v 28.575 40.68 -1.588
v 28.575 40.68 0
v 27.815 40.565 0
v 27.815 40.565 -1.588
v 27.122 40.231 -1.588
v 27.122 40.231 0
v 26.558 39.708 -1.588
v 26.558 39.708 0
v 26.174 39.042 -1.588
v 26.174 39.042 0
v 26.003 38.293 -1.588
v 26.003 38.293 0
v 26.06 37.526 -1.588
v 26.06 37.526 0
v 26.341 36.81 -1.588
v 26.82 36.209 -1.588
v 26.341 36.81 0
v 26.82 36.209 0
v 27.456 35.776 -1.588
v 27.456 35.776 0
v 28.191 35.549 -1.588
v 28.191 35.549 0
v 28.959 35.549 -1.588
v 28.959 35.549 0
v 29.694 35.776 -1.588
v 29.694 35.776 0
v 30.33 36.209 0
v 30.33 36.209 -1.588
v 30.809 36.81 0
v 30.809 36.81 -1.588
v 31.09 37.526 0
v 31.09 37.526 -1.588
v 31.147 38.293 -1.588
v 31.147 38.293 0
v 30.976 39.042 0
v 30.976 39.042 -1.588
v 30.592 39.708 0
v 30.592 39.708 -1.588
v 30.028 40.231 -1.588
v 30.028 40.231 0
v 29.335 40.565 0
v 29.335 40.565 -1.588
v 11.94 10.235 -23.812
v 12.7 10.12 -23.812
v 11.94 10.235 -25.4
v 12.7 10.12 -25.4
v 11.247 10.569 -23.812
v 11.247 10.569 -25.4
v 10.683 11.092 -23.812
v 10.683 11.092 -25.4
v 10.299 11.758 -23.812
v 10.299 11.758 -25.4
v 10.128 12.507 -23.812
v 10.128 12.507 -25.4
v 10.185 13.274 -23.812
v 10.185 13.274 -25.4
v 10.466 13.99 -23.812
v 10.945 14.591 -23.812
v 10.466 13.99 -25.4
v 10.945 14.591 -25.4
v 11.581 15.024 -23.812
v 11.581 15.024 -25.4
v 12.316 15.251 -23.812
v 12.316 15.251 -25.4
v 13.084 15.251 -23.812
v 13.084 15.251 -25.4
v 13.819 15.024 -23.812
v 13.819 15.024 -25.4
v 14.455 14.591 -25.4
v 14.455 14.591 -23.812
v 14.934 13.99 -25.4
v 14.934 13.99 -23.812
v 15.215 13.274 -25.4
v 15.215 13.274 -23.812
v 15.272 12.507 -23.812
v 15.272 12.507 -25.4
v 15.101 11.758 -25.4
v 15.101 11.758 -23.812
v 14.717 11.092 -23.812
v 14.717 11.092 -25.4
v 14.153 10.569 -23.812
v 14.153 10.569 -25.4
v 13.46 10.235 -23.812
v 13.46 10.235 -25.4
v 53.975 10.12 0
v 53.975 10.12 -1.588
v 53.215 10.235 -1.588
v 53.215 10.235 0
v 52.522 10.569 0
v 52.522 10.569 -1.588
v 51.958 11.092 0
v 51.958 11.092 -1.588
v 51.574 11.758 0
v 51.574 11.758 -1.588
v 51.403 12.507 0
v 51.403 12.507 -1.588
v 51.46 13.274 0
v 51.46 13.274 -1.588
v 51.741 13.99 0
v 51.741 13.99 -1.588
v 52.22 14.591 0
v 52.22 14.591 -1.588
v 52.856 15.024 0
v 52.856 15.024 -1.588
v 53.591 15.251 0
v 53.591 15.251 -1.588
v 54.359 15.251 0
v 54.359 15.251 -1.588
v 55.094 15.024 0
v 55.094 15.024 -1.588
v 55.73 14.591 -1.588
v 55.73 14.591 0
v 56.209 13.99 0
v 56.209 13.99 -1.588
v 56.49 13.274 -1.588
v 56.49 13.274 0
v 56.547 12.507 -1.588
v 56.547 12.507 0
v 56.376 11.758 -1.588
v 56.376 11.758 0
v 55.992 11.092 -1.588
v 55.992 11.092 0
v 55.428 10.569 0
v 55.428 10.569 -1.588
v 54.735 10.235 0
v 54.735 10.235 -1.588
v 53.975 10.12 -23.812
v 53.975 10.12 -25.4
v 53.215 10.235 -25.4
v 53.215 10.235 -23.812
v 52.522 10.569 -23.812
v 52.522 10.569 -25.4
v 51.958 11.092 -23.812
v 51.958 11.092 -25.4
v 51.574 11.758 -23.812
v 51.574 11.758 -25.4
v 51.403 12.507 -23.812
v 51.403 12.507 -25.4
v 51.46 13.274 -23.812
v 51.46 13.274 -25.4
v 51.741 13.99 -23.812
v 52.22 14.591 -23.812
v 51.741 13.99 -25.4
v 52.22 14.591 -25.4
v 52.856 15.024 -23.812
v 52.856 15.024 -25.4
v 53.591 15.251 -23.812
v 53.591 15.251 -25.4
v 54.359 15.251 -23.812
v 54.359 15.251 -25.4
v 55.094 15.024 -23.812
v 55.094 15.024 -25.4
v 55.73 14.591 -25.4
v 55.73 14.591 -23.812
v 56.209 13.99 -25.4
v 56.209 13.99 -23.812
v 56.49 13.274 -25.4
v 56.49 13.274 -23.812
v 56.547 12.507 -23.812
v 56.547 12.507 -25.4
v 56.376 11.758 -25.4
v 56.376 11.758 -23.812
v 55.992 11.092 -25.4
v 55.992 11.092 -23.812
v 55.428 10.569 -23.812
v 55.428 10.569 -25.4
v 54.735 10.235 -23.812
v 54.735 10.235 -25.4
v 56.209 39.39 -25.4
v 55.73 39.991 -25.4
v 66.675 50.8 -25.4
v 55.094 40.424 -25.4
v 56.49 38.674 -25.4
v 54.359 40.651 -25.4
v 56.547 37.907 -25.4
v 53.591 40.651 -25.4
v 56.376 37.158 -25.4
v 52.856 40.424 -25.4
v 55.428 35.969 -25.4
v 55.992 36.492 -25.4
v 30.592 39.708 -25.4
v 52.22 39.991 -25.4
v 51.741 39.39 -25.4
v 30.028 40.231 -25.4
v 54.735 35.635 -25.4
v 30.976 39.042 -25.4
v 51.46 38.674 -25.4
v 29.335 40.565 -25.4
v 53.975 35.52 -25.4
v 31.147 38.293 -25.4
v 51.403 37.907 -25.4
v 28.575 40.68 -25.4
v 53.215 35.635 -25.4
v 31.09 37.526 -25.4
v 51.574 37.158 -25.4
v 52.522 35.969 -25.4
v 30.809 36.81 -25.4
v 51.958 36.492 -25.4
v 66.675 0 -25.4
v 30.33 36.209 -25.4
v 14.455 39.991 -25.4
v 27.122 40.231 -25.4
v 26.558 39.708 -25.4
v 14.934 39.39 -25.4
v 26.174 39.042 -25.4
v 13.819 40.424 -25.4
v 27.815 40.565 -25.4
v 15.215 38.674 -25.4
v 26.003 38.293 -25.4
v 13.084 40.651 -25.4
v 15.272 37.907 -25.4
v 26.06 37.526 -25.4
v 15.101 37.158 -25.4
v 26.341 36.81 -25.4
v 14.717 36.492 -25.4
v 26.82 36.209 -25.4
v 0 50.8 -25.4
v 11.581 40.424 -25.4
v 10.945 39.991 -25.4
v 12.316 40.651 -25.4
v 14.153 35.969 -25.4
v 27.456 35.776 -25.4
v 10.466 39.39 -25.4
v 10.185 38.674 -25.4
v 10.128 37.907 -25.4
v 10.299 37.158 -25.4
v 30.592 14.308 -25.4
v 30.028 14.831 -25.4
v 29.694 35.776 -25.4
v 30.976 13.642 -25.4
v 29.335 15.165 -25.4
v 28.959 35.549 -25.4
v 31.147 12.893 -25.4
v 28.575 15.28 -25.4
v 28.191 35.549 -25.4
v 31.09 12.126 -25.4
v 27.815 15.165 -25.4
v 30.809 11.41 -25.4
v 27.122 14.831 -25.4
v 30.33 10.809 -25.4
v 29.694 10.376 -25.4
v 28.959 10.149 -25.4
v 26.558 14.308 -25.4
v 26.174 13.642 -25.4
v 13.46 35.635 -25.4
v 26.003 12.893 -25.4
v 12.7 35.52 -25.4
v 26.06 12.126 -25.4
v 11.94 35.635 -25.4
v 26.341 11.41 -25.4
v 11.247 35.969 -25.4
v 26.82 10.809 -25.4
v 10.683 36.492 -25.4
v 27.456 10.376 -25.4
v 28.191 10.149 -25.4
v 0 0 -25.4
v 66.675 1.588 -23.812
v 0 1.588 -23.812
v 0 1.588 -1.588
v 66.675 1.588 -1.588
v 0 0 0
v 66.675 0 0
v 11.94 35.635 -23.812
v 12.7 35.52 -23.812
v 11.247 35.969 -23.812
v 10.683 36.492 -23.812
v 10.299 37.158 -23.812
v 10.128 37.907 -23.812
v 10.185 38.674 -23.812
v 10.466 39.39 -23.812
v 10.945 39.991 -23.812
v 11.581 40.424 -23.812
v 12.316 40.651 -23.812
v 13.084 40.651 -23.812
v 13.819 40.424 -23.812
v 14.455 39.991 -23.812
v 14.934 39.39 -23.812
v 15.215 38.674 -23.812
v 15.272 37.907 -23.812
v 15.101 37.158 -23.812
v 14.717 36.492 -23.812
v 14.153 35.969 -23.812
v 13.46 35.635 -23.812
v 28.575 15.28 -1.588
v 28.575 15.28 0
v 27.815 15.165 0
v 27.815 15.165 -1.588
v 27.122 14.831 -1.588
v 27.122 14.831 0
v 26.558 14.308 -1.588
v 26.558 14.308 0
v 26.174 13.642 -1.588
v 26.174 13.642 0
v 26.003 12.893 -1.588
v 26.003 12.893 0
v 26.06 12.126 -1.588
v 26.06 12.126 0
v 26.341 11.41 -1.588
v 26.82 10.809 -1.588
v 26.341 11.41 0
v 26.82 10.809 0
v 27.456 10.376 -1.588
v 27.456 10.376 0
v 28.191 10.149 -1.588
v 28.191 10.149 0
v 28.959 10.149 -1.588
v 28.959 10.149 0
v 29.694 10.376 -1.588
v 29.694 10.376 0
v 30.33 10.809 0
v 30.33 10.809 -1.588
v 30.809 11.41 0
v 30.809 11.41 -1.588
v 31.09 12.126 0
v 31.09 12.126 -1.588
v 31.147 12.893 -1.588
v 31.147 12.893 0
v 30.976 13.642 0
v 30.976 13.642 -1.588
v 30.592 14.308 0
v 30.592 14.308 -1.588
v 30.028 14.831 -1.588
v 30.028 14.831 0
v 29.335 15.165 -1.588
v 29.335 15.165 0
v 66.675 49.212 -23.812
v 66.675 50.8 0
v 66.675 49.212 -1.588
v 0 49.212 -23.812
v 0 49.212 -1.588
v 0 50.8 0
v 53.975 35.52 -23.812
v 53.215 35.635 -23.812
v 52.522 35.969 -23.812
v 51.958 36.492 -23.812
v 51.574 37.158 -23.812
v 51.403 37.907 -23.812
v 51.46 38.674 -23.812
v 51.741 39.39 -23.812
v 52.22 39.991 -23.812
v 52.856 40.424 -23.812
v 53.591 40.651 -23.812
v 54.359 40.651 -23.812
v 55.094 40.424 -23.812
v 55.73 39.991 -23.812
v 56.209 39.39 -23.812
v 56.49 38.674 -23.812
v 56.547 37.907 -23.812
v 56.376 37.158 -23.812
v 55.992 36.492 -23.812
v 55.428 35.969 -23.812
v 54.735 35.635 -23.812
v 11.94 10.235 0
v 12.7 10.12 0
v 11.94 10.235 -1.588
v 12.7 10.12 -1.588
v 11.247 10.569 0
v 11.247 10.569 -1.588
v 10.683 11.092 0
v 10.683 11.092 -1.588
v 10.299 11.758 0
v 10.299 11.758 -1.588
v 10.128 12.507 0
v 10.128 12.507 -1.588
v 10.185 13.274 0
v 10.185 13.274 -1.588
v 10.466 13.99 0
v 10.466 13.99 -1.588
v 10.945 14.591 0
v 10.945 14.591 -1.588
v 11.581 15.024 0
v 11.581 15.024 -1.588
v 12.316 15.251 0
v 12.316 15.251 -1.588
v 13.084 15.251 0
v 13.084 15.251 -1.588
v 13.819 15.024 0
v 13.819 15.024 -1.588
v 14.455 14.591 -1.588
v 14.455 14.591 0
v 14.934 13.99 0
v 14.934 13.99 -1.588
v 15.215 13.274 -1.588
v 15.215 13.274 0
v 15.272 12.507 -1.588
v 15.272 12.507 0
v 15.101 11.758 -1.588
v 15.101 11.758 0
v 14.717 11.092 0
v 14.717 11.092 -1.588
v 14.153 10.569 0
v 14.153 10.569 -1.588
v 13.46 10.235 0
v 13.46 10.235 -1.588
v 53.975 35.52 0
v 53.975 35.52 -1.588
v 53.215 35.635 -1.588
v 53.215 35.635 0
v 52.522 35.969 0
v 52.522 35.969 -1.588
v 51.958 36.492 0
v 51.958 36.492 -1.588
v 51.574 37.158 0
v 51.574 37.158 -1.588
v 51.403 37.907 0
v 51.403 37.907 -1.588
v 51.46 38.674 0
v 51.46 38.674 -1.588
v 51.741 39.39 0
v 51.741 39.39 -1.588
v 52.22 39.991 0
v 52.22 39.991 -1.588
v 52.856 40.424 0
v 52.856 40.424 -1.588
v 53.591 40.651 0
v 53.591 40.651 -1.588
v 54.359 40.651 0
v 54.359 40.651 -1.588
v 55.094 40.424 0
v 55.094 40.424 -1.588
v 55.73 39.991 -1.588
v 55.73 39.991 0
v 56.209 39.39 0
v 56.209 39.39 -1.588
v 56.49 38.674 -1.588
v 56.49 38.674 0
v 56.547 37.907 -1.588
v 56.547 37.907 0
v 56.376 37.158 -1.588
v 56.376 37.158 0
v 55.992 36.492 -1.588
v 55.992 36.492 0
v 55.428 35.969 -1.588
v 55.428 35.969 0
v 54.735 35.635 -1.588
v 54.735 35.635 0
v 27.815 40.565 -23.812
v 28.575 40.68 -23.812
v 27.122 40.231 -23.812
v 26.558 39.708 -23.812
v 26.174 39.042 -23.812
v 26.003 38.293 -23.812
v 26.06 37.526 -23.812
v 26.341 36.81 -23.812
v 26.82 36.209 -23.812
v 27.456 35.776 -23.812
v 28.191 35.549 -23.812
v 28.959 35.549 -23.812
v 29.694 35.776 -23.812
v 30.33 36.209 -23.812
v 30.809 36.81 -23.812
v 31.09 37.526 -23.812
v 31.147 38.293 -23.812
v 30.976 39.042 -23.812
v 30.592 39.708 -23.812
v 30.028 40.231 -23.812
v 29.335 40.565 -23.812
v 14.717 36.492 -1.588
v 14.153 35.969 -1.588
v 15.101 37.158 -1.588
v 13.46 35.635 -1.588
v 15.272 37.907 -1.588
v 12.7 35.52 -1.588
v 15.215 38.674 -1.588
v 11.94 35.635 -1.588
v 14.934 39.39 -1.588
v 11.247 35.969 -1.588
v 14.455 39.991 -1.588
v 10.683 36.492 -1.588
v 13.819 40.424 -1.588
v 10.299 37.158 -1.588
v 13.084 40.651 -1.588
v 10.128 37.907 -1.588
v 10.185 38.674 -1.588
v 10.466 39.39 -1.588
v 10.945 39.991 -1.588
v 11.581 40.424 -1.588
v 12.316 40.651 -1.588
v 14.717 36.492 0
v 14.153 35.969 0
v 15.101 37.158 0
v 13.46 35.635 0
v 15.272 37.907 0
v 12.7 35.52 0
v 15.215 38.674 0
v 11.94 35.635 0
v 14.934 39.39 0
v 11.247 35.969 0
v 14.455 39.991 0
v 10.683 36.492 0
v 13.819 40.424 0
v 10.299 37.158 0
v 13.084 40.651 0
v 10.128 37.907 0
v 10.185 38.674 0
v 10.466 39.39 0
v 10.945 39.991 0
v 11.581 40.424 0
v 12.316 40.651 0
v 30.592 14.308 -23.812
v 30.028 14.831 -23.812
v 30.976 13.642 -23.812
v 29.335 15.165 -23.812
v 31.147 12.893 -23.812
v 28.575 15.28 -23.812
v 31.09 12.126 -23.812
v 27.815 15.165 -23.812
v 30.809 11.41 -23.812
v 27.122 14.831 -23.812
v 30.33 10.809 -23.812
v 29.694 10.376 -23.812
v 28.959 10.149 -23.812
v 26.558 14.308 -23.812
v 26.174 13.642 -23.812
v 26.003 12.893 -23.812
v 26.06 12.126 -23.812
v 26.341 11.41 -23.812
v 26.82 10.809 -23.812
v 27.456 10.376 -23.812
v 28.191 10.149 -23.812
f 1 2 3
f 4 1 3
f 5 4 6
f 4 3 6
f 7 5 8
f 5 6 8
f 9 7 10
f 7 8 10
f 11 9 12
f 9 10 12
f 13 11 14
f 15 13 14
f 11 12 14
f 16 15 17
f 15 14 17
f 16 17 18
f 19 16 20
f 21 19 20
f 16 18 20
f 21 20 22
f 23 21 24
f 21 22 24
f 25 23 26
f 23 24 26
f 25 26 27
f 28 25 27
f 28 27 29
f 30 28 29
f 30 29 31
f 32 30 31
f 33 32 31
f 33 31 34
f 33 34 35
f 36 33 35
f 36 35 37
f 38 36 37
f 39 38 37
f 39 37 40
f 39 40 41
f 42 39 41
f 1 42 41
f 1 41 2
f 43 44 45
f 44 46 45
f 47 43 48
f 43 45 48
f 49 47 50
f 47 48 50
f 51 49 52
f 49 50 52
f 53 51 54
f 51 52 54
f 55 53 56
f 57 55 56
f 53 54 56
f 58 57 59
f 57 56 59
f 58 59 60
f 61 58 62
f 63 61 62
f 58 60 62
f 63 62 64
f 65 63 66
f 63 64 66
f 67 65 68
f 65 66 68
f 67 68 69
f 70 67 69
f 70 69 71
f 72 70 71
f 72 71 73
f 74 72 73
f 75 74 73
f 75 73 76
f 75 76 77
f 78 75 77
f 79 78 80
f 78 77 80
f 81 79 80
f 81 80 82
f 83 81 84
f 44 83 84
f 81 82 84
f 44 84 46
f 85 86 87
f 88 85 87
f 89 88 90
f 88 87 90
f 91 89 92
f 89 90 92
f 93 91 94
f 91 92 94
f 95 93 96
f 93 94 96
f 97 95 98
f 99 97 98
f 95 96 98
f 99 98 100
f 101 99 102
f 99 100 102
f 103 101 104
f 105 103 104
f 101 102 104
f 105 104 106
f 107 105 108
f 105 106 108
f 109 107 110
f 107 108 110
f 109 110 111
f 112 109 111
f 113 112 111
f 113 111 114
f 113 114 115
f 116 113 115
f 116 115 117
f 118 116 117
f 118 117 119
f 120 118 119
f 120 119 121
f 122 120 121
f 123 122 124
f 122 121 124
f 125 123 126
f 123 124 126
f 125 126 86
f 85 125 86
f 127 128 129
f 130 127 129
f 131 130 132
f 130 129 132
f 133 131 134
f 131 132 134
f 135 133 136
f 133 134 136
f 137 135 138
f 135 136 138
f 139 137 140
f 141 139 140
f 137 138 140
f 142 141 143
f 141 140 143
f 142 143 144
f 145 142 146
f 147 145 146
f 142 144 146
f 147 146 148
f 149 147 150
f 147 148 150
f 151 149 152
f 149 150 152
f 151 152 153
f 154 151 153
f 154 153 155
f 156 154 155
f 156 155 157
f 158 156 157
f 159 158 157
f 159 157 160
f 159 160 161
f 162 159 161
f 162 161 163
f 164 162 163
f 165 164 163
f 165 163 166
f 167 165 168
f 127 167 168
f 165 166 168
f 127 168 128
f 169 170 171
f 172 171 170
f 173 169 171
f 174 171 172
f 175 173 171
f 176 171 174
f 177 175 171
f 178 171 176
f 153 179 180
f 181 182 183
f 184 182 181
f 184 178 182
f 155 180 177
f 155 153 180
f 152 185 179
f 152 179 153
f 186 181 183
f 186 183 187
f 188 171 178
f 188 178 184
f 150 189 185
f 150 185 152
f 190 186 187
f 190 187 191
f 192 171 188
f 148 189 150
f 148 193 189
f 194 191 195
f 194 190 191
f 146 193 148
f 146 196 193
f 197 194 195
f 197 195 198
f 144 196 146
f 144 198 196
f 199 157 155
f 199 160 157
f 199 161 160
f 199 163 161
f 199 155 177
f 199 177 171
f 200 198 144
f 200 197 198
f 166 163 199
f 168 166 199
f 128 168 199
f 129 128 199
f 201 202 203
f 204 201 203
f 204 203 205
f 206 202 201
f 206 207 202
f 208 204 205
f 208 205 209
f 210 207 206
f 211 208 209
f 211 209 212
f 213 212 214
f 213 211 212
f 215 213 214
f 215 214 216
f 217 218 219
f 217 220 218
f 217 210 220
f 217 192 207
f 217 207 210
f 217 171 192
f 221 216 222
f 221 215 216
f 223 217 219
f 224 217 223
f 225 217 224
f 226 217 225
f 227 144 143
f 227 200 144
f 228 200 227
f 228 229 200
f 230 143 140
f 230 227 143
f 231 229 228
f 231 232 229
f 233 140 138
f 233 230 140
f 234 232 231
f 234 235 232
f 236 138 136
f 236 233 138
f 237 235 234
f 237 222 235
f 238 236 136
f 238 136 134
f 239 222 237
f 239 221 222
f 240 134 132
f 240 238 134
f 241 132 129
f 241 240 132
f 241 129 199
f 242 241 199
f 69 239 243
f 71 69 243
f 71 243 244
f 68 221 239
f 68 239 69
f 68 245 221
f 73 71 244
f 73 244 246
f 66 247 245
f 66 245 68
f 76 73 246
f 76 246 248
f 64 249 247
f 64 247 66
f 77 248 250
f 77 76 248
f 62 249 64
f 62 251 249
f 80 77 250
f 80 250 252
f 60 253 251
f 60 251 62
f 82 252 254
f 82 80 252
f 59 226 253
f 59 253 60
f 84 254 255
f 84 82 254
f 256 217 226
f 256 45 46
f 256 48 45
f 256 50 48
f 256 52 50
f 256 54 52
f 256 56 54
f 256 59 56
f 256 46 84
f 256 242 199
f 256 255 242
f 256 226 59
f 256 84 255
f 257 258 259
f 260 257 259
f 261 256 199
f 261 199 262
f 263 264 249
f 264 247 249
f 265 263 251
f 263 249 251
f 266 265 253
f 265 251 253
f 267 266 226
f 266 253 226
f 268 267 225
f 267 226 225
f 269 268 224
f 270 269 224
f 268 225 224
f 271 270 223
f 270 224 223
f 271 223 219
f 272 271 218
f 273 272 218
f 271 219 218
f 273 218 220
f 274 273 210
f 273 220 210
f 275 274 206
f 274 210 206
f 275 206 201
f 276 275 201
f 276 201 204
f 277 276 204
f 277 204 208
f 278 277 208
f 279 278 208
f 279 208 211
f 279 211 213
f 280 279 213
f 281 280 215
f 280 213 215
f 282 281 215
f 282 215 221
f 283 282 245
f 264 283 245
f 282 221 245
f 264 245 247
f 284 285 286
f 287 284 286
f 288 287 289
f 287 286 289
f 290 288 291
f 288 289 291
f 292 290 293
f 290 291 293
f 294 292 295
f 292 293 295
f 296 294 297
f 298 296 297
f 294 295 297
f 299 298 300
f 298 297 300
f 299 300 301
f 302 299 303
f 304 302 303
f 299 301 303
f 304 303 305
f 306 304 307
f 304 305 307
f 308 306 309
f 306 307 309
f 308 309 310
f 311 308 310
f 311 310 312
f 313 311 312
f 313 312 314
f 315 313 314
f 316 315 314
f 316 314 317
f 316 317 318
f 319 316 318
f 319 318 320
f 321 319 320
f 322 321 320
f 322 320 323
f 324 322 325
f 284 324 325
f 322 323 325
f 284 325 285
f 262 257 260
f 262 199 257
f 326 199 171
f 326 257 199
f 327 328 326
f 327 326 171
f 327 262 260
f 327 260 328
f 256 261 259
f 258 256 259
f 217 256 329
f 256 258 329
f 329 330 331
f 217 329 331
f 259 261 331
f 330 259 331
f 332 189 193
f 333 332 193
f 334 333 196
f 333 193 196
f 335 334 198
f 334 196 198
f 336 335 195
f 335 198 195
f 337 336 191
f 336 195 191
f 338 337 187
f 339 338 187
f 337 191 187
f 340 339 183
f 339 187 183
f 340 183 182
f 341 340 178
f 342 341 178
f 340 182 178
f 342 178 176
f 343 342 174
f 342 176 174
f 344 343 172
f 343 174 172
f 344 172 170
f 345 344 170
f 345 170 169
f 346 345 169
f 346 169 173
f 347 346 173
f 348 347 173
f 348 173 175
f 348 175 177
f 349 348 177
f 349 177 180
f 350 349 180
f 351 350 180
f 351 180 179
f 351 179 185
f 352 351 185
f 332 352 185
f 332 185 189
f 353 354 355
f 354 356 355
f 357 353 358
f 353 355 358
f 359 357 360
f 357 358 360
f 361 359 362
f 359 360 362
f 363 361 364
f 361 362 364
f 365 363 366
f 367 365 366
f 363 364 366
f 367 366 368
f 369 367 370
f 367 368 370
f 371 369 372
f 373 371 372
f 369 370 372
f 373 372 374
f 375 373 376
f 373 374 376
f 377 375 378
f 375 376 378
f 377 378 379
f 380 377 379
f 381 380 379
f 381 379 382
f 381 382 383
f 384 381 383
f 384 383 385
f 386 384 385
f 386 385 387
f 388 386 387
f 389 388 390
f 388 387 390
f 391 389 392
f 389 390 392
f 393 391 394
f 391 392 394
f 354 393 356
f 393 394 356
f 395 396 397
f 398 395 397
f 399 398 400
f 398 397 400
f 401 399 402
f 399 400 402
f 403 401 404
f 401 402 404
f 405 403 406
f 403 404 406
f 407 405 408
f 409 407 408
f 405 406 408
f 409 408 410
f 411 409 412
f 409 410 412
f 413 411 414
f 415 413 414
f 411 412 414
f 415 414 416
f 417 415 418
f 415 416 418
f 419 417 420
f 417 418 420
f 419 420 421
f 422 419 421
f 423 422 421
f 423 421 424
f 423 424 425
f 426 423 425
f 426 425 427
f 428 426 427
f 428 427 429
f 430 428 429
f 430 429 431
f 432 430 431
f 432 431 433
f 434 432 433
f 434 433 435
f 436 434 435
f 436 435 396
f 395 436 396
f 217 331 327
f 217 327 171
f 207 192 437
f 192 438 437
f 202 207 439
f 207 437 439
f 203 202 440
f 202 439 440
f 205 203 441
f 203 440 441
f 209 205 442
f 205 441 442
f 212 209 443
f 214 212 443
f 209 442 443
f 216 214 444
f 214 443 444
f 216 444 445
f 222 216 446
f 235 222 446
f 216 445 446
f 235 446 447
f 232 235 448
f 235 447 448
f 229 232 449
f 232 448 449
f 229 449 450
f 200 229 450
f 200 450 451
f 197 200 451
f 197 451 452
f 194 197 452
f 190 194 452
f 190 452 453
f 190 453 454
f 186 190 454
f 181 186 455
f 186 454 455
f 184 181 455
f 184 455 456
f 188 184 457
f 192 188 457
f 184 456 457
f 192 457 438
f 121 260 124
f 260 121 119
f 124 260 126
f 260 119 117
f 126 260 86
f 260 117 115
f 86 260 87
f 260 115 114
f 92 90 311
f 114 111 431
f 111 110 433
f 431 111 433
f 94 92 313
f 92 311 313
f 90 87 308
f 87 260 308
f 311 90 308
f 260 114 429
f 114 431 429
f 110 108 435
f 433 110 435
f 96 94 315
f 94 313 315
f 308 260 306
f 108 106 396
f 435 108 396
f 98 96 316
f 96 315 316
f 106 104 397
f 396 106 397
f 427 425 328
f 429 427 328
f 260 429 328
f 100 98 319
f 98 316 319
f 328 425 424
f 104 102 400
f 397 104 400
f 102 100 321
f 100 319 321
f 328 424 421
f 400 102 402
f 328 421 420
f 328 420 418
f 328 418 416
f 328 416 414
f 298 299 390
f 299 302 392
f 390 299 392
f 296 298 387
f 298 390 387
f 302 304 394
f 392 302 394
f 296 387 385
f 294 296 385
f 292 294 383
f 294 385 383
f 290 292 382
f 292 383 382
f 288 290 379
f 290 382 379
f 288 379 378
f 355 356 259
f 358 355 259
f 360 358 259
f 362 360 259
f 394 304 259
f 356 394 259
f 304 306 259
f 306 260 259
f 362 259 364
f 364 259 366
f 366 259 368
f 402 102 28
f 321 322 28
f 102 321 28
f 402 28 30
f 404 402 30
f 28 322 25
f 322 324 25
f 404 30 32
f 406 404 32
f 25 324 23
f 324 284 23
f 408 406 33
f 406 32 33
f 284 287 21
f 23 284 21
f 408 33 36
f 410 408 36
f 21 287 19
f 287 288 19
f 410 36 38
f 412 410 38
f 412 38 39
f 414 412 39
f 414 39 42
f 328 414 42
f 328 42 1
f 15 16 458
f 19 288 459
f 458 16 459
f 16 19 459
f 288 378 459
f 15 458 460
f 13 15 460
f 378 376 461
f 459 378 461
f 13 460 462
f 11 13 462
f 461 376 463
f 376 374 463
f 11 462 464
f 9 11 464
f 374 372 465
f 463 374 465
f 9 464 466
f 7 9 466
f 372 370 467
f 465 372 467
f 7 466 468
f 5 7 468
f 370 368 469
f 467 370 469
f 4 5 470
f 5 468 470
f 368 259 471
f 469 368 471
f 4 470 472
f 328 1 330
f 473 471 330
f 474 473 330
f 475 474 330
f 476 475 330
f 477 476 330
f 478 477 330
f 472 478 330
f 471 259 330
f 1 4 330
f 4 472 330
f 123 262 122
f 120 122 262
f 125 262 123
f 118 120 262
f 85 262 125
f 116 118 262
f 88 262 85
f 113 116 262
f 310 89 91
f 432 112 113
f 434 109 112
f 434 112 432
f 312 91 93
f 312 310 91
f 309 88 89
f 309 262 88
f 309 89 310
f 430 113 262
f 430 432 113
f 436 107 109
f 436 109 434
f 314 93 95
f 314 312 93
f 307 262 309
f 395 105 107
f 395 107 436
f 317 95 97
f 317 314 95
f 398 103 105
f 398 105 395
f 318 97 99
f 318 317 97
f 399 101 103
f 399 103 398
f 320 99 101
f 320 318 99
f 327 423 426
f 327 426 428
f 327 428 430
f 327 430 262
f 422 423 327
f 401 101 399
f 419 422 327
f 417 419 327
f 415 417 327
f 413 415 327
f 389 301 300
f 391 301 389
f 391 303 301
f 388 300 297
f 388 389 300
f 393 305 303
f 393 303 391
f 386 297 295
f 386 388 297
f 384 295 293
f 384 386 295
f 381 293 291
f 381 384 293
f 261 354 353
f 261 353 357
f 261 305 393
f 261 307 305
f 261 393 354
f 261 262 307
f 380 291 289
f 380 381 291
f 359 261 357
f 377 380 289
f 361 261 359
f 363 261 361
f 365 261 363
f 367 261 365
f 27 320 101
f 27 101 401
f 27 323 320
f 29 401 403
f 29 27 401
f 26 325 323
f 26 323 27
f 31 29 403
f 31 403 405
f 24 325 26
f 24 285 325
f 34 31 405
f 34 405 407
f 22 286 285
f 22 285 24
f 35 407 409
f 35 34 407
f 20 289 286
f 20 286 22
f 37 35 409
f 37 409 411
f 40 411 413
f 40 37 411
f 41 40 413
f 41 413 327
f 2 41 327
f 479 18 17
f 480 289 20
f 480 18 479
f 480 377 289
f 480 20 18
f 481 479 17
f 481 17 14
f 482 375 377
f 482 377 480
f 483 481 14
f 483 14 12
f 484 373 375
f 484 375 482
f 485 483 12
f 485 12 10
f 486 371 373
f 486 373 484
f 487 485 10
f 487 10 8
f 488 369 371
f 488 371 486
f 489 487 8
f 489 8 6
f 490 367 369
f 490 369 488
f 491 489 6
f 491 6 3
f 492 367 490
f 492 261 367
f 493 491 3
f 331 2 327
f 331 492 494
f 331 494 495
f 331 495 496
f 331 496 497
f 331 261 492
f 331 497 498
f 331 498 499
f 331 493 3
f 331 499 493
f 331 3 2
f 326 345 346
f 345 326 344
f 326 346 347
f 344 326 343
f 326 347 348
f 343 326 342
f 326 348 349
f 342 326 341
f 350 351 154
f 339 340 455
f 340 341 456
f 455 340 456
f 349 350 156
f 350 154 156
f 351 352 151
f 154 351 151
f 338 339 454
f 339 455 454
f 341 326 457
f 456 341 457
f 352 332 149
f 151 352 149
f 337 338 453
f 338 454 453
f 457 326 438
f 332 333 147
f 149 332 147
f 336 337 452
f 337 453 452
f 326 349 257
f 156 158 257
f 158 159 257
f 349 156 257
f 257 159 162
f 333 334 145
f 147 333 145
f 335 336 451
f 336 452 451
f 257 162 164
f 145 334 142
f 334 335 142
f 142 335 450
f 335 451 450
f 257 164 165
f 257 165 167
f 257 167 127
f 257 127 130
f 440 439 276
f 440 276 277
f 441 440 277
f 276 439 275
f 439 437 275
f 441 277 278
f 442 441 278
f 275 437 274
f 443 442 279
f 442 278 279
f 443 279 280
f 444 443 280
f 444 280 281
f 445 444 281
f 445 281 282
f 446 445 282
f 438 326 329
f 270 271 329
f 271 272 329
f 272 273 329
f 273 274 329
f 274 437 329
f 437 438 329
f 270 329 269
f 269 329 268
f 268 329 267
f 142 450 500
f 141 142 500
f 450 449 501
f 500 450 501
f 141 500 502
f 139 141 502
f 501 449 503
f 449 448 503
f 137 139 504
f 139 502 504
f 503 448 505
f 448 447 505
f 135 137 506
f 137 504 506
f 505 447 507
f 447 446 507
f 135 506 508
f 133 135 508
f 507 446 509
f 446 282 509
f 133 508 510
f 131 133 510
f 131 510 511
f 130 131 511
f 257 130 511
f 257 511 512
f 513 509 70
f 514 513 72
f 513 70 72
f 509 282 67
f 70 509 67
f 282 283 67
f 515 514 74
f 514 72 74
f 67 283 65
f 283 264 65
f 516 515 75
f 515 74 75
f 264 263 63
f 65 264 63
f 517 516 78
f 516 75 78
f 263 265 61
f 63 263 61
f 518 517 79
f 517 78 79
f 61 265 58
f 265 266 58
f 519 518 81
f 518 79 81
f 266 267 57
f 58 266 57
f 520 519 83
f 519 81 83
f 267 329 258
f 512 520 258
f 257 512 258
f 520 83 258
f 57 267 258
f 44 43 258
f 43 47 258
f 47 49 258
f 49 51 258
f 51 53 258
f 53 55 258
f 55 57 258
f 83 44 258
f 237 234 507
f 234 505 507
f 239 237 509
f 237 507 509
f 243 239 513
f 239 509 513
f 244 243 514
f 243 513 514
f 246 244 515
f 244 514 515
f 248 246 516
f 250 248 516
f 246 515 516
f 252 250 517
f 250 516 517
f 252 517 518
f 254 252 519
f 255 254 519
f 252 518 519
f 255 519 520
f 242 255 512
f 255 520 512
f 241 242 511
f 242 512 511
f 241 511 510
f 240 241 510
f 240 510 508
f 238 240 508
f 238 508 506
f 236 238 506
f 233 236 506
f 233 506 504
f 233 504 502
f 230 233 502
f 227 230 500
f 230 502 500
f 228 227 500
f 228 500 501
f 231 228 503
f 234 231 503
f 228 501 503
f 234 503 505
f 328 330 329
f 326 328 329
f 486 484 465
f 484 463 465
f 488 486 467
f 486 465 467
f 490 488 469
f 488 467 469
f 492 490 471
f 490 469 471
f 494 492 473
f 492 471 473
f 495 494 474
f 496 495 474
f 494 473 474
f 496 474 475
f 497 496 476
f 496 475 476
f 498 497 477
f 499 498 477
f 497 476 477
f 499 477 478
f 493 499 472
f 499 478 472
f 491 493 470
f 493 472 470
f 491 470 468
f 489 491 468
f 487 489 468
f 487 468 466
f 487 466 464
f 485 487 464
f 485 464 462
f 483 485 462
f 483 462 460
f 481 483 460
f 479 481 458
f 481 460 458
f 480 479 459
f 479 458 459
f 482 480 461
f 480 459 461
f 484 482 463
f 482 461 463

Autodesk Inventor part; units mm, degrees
ref_plane "YZ Plane" through (0, 0, 0) normal (1, 0, 0) x (0, 1, 0)
ref_plane "XZ Plane" through (0, 0, 0) normal (0, 1, 0) x (-1, 0, 0)
ref_plane "XY Plane" through (0, 0, 0) normal (0, 0, 1) x (1, 0, 0)
sketch "Sketch1" plane through (0, 0, 0) normal (1, 0, 0) x (0, 1, 0)
  line L0 (0, 0) -> (50.8, 0)
  line L1 (50.8, 0) -> (50.8, -25.4)
  line L2 (50.8, -25.4) -> (0, -25.4)
  line L3 (0, -25.4) -> (0, 0)
  dimension "d0" = 50.8
  dimension "d1" = 25.4
extrude "Extrusion1" add sketch "Sketch1" along normal blind 66.675
shell "Shell1" thickness 1.5875 removed faces 2 at (0, 16.9333, -16.9333) at (66.675, 16.9333, -16.9333)
hole "Hole1" at (53.975, 12.7, 0) direction (0, 0, -1) diameter 5.1594 end through all
hole "Hole2" at (53.975, 38.1, 0) direction (0, 0, -1) diameter 5.1594 end through all
hole "Hole3" at (12.7, 38.1, 0) direction (0, 0, -1) diameter 5.1594 end through all
hole "Hole4" at (12.7, 12.7, 0) direction (0, 0, -1) diameter 5.1594 end through all
hole "Hole5" at (28.575, 38.1, -25.4) direction (0, 0, 1) diameter 5.1594 end through all
hole "Hole6" at (28.575, 12.7, -25.4) direction (0, 0, 1) diameter 5.1594 end through all
properties part number "1x2 2 625 in Beam Flywheel Mount"
